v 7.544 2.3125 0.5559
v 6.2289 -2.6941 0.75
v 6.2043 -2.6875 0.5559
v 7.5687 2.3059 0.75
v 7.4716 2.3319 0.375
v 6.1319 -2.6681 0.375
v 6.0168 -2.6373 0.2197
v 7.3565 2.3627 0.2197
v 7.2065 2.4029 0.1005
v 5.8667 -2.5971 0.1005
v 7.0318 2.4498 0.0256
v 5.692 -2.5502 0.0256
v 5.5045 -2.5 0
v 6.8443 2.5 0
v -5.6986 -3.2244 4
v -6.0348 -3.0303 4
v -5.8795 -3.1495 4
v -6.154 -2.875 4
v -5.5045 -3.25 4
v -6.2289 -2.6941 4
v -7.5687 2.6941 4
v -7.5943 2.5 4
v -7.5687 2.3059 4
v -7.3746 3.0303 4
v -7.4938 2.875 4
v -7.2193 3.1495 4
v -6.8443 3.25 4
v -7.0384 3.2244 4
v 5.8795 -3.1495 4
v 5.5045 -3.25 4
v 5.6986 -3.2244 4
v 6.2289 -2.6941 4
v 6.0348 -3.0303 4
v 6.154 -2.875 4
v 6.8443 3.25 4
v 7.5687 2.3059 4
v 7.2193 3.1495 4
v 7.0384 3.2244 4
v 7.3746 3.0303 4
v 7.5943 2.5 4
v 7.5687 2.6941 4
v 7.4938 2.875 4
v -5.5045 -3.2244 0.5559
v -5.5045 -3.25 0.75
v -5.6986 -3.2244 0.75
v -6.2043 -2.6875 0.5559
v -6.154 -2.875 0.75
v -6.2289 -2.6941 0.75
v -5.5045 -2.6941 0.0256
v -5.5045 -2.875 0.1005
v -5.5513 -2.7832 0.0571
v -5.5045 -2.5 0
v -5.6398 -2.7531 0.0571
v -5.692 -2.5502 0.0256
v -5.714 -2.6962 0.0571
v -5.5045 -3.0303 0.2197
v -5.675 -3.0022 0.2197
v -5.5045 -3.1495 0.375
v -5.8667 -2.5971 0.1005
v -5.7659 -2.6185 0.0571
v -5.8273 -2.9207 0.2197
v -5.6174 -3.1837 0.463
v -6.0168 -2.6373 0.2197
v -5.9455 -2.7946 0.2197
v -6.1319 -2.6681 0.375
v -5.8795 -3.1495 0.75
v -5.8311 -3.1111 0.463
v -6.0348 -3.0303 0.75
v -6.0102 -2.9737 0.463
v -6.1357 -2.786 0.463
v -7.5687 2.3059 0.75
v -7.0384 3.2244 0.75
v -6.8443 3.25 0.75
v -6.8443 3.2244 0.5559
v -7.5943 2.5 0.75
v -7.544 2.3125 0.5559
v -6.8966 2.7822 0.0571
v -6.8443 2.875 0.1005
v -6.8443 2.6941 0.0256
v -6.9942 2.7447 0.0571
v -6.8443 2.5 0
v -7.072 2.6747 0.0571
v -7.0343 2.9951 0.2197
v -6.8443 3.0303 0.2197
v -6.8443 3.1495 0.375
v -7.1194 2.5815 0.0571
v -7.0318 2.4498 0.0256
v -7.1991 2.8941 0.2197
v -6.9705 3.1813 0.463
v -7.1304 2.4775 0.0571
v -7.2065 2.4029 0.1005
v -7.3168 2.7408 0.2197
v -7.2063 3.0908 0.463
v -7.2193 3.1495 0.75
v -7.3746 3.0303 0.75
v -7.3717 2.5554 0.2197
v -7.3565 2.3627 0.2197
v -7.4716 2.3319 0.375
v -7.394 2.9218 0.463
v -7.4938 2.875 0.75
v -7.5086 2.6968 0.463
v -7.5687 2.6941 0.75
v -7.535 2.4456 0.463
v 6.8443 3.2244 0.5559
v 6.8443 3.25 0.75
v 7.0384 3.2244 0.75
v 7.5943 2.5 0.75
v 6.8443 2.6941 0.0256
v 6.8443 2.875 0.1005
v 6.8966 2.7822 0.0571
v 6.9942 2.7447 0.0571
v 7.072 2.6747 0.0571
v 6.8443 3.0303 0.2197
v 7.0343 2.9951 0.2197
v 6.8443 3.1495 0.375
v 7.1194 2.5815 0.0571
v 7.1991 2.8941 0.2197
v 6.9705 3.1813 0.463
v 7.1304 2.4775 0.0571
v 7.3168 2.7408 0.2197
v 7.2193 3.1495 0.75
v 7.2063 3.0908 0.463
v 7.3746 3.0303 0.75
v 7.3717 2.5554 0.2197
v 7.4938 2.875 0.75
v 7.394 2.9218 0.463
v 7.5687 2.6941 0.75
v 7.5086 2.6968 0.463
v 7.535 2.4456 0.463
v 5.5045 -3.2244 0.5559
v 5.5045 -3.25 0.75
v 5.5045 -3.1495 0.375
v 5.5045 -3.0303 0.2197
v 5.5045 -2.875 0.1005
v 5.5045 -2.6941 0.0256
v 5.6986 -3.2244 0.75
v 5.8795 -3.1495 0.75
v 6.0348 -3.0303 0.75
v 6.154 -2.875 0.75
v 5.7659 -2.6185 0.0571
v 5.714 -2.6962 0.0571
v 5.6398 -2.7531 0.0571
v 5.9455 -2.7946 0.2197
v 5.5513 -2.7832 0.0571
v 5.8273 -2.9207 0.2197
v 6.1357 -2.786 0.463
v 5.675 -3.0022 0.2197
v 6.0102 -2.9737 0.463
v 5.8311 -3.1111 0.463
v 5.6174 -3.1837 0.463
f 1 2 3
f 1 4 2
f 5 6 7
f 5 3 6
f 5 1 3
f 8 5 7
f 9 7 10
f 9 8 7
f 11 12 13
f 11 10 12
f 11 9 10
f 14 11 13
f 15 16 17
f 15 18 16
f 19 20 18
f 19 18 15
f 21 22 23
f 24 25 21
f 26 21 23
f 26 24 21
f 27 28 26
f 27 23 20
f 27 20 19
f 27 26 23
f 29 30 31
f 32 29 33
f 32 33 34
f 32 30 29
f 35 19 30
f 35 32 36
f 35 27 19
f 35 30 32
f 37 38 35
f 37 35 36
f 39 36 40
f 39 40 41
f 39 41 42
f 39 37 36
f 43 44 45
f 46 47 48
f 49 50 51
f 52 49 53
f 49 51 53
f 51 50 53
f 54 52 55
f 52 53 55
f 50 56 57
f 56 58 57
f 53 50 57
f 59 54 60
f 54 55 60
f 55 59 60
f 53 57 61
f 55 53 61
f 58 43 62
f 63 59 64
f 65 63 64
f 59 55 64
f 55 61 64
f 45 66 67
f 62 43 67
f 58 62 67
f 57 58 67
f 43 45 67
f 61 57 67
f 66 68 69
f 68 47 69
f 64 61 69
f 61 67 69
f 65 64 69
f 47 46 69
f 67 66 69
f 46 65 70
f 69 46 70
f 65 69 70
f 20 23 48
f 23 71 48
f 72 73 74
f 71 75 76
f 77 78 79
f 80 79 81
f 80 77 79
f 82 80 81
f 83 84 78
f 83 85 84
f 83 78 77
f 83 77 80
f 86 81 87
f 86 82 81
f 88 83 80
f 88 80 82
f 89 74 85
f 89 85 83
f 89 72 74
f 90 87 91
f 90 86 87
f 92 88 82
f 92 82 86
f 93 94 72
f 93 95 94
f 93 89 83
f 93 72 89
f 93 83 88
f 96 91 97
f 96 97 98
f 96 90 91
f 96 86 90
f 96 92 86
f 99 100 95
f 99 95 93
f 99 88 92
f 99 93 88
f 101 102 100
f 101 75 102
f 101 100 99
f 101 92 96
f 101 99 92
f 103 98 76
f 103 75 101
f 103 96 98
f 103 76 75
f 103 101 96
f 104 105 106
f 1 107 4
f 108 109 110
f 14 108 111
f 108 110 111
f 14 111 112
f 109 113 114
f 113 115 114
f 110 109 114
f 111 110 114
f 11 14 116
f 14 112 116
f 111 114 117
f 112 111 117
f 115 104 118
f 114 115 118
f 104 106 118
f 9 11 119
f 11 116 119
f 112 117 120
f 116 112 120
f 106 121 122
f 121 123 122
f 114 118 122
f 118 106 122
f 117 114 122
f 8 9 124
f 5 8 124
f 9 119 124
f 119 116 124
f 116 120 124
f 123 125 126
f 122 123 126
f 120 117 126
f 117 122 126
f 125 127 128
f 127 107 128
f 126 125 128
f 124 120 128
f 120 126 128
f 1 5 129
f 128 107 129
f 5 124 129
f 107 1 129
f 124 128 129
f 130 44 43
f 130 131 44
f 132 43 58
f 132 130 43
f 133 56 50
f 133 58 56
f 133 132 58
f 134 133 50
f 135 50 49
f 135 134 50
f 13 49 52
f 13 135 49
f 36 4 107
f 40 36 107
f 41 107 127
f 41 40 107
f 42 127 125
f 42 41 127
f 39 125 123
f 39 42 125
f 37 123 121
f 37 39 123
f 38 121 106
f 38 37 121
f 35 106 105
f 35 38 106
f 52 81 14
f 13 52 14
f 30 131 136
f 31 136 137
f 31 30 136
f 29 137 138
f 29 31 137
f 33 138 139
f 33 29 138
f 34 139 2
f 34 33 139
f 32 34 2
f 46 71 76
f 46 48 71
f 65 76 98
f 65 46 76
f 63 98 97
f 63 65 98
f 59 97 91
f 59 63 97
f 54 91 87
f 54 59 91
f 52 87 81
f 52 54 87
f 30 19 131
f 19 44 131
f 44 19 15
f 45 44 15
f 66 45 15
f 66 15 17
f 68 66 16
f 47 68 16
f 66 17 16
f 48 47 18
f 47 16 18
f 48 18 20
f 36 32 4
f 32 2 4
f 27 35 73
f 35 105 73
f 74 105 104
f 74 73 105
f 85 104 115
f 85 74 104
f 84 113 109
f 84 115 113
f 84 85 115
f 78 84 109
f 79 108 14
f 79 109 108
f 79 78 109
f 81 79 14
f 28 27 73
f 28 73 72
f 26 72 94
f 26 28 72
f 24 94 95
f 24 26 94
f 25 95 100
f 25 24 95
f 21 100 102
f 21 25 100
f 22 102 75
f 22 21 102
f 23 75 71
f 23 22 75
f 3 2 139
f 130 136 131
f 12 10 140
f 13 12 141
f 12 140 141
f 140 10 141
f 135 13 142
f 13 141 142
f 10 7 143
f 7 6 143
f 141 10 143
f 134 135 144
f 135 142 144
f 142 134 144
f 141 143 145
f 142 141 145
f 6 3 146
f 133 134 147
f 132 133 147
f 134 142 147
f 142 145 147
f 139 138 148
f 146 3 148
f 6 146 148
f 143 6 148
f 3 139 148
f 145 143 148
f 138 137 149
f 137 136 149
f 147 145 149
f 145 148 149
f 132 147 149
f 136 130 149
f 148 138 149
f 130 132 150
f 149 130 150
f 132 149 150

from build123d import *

# Parameters (mm, degrees)
EXTRUDE_1_DEPTH = 4
FILLET_1_R      = 0.75


with BuildPart() as part:
    # Эскиз1 → Бобышка-Вытянуть1 (new body)
    with BuildSketch(Plane.XY):
        Polygon((-6.08, -3.25), (6.08, -3.25), (7.821669751, 3.25), (-7.821669751, 3.25), align=None)
    extrude(amount=EXTRUDE_1_DEPTH)

    # Скругление1
    fillet_1_edges = [part.edges().sort_by_distance(p)[0] for p in [
        (0, 3.25, 0),
        (6.950834875, 0, 0),
        (0, -3.25, 0),
        (-6.950834875, 0, 0),
        (-7.821669751, 3.25, 2),
        (7.821669751, 3.25, 2),
        (6.08, -3.25, 2),
        (-6.08, -3.25, 2),
    ]]
    fillet(fillet_1_edges, radius=FILLET_1_R)


solid = part.part
